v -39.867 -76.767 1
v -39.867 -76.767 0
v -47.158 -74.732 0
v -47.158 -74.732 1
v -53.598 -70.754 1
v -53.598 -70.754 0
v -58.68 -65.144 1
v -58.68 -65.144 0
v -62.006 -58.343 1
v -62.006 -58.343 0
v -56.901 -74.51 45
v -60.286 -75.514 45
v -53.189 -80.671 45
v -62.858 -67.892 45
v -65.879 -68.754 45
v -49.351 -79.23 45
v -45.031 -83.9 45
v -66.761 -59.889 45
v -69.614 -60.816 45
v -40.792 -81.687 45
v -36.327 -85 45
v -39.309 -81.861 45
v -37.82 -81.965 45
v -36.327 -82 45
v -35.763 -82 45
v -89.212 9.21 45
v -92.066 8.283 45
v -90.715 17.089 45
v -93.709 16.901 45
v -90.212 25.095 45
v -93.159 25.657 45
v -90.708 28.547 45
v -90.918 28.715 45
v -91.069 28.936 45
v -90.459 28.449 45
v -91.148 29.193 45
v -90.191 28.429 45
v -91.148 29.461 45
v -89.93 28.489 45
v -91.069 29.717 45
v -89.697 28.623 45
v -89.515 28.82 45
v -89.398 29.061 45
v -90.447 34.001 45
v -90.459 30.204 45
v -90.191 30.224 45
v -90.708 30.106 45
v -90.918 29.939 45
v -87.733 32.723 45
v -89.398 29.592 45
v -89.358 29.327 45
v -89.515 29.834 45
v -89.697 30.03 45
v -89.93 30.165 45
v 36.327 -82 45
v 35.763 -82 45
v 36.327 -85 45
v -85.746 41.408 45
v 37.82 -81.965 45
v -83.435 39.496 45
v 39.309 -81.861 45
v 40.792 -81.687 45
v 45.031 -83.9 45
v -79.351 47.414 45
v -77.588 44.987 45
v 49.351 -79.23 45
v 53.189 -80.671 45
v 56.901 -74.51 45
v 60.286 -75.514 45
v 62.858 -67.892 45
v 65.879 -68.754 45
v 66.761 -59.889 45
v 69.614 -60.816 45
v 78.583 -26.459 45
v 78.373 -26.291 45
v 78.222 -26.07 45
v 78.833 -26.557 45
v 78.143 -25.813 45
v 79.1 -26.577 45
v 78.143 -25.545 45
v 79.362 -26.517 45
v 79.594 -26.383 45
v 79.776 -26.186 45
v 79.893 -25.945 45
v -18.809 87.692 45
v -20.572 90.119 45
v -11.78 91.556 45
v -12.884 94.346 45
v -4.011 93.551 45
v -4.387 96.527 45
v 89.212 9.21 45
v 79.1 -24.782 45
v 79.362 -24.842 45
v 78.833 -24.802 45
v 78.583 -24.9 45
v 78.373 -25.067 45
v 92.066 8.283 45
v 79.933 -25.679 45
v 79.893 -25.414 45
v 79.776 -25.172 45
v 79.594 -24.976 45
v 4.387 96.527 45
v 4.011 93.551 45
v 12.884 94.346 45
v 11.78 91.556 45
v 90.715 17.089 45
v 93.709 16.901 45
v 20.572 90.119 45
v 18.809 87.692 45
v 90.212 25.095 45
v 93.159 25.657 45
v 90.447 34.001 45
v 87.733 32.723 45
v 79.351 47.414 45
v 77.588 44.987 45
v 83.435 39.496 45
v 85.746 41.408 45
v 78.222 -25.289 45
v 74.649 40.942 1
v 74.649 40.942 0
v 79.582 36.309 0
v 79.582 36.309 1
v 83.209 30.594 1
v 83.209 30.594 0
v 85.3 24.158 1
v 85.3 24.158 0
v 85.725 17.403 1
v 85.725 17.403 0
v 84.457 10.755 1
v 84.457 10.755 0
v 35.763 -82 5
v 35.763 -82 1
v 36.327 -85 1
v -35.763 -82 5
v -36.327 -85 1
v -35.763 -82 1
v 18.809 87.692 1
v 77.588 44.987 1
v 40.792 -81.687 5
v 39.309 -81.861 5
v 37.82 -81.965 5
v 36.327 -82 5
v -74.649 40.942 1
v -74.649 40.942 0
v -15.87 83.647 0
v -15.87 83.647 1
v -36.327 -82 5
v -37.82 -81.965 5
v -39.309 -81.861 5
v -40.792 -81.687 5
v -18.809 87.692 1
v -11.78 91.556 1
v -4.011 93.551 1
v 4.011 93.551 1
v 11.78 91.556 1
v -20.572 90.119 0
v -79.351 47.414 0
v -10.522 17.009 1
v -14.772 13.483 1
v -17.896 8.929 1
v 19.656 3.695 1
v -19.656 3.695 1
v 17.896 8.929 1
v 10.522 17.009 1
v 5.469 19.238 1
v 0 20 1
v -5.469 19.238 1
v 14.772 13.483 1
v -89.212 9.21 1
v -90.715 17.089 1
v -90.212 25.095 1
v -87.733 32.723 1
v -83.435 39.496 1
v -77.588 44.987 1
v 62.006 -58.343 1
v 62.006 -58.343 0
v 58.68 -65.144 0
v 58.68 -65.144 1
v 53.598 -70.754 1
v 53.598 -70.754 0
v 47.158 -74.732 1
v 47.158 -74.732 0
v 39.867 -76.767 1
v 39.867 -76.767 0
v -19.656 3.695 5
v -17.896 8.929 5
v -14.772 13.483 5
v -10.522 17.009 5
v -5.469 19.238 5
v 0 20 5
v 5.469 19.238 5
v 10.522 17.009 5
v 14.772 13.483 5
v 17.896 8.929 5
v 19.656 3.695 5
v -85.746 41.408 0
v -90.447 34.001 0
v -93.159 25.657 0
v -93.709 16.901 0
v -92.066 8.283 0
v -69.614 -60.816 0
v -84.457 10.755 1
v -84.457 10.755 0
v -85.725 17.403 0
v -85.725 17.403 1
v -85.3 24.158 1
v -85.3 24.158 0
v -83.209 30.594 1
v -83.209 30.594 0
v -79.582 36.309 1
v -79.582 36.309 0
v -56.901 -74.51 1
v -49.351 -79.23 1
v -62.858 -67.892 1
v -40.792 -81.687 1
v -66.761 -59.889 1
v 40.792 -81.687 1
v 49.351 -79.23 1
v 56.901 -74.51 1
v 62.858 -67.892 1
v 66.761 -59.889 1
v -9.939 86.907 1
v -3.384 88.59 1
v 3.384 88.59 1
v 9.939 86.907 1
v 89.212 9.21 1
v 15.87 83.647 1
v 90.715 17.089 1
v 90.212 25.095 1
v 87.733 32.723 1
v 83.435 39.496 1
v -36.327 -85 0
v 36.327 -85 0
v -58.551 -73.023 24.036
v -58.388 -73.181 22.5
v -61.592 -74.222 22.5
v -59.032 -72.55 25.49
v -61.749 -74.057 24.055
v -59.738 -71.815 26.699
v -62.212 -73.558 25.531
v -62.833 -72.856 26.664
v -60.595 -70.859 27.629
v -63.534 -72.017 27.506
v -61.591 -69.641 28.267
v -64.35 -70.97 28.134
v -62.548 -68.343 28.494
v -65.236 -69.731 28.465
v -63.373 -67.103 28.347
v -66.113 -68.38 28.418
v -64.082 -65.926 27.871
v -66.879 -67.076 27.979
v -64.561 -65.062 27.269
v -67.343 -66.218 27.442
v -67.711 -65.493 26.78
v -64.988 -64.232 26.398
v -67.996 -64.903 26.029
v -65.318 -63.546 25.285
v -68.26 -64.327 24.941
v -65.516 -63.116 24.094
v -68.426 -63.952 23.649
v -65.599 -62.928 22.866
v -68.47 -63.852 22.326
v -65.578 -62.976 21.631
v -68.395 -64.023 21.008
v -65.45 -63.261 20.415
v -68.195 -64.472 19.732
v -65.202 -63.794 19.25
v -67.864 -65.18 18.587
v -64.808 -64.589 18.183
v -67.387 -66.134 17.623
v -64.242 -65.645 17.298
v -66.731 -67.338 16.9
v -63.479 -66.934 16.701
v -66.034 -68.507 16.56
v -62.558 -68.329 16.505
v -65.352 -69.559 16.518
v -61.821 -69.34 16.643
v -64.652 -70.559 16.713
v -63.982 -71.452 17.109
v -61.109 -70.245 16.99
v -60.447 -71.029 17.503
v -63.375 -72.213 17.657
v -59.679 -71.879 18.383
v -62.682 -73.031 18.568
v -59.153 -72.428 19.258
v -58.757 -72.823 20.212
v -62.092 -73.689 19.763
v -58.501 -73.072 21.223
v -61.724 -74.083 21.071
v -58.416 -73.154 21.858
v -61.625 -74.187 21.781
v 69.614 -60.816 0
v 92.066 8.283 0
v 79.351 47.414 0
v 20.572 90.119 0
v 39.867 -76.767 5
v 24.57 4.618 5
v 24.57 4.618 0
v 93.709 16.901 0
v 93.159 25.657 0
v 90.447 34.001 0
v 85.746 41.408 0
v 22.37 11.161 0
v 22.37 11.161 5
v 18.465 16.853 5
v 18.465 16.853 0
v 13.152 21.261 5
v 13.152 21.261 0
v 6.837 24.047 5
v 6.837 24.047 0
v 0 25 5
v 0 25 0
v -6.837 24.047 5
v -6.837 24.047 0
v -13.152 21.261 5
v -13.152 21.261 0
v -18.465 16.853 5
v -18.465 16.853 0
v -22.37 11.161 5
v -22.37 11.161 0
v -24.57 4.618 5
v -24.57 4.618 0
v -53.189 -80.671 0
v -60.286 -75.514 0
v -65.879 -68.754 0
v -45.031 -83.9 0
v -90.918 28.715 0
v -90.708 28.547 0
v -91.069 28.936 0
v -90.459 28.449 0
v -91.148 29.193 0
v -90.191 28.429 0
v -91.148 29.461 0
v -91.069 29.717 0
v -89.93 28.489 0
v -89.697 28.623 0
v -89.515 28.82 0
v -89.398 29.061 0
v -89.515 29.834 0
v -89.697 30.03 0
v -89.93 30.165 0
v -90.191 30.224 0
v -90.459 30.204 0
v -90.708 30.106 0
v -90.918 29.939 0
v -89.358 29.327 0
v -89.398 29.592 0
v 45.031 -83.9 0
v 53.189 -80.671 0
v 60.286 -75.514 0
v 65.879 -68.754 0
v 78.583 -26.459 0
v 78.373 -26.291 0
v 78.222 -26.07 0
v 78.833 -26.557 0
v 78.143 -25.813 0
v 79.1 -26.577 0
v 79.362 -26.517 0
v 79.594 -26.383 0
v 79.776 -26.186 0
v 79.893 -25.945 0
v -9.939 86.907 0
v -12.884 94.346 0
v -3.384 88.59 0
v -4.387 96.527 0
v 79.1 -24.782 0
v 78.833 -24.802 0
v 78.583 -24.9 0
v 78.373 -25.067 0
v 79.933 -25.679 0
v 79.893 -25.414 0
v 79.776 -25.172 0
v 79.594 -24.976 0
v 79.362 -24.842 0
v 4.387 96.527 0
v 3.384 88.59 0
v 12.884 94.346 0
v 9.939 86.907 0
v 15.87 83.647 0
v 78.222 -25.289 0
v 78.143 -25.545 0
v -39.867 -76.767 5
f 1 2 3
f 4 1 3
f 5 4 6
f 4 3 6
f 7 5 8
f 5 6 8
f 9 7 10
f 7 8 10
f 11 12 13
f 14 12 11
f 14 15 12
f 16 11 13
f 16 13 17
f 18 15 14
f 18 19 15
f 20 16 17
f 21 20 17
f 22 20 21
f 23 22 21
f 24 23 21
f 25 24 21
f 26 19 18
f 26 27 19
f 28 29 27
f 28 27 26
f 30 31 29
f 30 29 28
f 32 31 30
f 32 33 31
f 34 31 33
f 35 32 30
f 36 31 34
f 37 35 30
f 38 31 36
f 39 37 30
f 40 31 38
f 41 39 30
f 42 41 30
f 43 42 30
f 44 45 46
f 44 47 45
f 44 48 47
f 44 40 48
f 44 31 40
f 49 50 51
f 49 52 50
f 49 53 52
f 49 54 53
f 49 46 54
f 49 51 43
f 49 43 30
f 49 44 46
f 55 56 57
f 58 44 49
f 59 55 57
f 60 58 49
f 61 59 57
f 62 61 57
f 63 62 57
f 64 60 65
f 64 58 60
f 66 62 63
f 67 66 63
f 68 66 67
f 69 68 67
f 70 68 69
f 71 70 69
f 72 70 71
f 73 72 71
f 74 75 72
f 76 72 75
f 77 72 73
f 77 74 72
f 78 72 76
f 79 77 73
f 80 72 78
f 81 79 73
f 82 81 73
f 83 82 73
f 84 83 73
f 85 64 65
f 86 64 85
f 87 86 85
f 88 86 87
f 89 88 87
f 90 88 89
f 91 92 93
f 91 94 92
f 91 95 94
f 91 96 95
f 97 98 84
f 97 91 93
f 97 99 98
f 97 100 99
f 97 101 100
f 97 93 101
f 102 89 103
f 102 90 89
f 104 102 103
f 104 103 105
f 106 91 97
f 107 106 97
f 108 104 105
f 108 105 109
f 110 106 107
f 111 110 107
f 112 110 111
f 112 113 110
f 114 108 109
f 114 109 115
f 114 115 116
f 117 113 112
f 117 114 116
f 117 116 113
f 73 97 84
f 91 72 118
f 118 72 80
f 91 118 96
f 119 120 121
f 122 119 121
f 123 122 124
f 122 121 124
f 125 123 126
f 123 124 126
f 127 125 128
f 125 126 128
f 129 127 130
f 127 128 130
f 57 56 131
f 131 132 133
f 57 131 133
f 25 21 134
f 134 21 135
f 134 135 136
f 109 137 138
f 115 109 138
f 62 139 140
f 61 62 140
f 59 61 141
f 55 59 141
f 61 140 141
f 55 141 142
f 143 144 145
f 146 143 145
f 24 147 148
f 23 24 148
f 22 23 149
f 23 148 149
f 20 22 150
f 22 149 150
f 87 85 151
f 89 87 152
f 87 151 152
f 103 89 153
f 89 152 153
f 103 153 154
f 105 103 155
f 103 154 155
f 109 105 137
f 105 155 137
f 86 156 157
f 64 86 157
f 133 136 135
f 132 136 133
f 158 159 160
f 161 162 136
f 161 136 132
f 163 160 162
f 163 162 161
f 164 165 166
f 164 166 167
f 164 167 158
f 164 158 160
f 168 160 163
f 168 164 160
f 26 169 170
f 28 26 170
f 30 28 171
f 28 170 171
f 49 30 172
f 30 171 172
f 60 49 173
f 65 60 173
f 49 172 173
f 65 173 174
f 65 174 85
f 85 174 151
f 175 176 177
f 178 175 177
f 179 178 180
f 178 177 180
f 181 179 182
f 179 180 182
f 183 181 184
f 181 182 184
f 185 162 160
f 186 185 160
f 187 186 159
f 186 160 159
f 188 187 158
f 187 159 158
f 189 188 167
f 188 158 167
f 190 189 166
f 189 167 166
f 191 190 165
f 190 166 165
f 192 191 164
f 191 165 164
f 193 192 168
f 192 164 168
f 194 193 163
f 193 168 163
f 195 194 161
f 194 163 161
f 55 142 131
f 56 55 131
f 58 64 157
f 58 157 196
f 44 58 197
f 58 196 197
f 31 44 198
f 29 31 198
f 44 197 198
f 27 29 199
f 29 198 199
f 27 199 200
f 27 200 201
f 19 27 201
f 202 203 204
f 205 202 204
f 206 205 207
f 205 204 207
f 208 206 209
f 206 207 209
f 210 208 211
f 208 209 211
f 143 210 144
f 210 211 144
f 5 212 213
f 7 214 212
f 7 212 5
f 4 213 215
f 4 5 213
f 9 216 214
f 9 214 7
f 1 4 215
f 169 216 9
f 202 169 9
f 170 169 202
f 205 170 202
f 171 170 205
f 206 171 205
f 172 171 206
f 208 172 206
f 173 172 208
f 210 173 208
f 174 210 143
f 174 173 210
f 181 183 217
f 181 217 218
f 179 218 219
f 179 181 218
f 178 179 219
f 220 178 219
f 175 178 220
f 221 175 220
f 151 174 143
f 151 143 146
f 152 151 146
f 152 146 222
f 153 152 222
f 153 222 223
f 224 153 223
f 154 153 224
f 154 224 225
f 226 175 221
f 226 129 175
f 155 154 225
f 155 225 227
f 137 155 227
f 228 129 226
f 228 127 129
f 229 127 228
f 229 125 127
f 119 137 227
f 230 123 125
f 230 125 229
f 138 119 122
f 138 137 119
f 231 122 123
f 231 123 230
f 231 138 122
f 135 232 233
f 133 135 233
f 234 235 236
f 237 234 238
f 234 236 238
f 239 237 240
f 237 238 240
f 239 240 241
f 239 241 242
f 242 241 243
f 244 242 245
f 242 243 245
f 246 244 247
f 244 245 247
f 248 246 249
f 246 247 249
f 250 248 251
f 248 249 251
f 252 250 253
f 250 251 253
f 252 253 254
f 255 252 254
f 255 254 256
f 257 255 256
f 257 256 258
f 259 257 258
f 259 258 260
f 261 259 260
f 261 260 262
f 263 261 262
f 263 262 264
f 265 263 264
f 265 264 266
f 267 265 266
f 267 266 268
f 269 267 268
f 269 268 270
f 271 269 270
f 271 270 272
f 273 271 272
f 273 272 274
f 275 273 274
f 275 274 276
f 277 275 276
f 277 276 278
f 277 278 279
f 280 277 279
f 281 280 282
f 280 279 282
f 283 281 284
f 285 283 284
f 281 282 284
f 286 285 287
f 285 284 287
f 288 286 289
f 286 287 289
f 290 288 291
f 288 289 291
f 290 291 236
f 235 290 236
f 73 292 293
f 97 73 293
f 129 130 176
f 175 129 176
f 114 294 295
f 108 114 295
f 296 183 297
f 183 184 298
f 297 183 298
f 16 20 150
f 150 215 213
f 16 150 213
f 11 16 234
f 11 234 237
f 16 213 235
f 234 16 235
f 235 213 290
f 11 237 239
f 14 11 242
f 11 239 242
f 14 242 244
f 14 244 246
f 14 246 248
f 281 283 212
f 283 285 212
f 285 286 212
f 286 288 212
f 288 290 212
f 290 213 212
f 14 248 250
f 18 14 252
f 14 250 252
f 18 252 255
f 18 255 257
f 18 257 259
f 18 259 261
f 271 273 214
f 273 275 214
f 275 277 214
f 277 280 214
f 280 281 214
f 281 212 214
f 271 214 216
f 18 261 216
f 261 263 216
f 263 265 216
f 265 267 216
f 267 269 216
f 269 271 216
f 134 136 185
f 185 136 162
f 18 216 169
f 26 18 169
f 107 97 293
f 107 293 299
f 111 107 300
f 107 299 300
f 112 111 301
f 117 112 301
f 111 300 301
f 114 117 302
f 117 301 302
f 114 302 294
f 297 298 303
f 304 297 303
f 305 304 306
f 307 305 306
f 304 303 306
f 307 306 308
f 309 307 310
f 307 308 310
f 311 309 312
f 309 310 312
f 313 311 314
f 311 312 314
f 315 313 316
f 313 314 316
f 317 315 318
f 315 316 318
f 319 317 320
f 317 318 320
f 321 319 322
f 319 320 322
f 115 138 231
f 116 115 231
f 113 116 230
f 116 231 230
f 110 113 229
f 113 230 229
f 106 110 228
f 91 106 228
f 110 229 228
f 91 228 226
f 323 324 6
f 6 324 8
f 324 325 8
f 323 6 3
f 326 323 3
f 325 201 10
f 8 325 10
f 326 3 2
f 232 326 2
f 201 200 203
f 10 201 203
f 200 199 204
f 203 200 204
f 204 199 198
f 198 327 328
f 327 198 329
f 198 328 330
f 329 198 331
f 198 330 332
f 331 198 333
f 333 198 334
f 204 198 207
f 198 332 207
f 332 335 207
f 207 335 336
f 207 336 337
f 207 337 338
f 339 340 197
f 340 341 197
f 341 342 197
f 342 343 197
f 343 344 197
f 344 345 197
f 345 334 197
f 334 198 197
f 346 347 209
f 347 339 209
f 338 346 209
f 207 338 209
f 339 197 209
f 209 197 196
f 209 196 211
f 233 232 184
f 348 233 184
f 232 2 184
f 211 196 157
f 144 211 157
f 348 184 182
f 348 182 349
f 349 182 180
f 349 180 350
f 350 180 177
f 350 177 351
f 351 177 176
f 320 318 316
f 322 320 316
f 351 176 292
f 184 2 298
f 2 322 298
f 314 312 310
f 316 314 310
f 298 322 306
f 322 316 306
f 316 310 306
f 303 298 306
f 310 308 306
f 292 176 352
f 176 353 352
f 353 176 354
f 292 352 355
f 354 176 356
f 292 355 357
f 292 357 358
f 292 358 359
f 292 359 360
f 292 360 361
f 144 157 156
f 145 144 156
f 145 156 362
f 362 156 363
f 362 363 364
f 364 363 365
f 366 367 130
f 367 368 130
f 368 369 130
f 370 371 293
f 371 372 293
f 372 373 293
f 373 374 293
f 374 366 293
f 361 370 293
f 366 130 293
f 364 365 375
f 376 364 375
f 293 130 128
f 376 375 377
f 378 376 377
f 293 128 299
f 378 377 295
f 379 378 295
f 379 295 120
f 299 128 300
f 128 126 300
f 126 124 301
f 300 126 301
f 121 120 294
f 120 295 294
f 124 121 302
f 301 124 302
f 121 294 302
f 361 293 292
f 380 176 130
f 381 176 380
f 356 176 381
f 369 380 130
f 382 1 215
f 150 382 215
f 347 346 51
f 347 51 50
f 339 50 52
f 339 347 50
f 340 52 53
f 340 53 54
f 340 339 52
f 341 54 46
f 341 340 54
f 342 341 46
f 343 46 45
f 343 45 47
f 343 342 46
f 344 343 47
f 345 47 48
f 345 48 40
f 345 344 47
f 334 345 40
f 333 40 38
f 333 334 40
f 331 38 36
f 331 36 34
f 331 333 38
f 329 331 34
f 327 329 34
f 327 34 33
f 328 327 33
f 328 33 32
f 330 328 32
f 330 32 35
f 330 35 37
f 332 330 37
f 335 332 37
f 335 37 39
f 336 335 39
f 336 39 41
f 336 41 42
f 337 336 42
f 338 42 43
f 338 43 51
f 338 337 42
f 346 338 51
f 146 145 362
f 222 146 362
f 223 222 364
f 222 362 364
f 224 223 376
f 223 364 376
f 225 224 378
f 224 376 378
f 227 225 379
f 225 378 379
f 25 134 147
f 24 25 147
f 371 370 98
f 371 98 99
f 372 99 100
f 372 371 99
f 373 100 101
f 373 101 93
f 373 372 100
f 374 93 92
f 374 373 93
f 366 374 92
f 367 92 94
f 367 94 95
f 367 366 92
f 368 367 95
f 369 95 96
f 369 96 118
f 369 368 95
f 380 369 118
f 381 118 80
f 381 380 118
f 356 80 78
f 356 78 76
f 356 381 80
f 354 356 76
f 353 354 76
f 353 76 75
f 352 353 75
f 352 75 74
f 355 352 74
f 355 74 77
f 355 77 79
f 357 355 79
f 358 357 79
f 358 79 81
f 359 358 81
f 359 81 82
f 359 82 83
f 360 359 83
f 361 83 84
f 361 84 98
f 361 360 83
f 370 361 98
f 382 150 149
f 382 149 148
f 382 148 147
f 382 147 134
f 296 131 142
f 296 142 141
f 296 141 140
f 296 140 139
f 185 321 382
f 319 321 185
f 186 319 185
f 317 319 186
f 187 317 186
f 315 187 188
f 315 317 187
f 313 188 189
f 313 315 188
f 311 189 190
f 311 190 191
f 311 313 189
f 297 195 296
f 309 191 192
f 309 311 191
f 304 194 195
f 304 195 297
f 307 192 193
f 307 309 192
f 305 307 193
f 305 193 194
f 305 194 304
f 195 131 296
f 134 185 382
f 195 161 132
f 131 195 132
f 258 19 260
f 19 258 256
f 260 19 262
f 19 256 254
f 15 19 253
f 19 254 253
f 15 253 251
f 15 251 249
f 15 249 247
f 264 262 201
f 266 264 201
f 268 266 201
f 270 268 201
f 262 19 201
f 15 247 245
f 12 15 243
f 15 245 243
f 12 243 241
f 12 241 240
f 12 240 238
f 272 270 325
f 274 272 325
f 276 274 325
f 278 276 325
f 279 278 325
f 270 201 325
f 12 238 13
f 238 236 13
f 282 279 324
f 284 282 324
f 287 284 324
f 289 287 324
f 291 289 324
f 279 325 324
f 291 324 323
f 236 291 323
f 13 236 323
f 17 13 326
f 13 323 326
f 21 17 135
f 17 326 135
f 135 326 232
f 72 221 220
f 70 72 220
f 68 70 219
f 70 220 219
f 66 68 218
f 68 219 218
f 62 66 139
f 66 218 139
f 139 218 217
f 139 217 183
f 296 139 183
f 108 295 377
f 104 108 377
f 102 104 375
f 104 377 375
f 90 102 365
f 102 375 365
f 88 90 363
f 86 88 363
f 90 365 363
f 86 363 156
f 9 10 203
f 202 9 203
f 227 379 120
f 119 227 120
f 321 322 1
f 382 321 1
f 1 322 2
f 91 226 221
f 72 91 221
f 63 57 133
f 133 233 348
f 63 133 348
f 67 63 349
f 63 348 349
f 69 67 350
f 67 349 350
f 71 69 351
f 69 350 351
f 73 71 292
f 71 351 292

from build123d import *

# Parameters (mm, degrees)
F0_R     = 0.9
F1_DEPTH = 45
F2_DEPTH = 5
F3_DEPTH = 1
F4_R     = 5.995213452
F5_DEPTH = 25


with BuildPart() as f1:
    # F0 (on Top) → F1 (new body)
    with BuildSketch(Plane.XY):
        with BuildLine():
            Line((69.6141044706, -60.8155948031), (92.0655032996, 8.2827057594))
            ThreePointArc((92.0655032996, 8.2827057594), (92.0655032996, 29.9138953656), (79.3510090595, 47.4138953656))
            Line((79.3510090595, 47.4138953656), (20.5724838302, 90.1189936781))
            ThreePointArc((20.5724838302, 90.1189936781), (0, 96.803398875), (-20.5724838302, 90.1189936781))
            Line((-20.5724838302, 90.1189936781), (-79.3510090595, 47.4138953656))
            ThreePointArc((-79.3510090595, 47.4138953656), (-92.0655032996, 29.9138953656), (-92.0655032996, 8.2827057594))
            Line((-92.0655032996, 8.2827057594), (-69.6141044706, -60.8155948031))
            ThreePointArc((-69.6141044706, -60.8155948031), (-56.8996102305, -78.3155948031), (-36.3271264003, -85))
            Line((-36.3271264003, -85), (-35.7632361451, -82))
            Line((-35.7632361451, -82), (-36.3271264003, -82))
            ThreePointArc((-36.3271264003, -82), (-38.5650226814, -81.9216512768), (-40.7919604428, -81.6869887647))
            ThreePointArc((-40.7919604428, -81.6869887647), (-56.9006983727, -74.5097559412), (-66.7609349217, -59.88854382))
            Line((-66.7609349217, -59.88854382), (-89.2123337507, 9.2097567425))
            ThreePointArc((-89.2123337507, 9.2097567425), (-89.2123337507, 28.9868443825), (-77.5876533026, 44.9868443825))
            Line((-77.5876533026, 44.9868443825), (-18.8091280734, 87.691942695))
            ThreePointArc((-18.8091280734, 87.691942695), (0, 93.803398875), (18.8091280734, 87.691942695))
            Line((18.8091280734, 87.691942695), (77.5876533026, 44.9868443825))
            ThreePointArc((77.5876533026, 44.9868443825), (89.2123337507, 28.9868443825), (89.2123337507, 9.2097567425))
            Line((89.2123337507, 9.2097567425), (66.7609349217, -59.88854382))
            ThreePointArc((66.7609349217, -59.88854382), (56.9006983727, -74.5097559412), (40.7919604428, -81.6869887647))
            ThreePointArc((40.7919604428, -81.6869887647), (38.5650226814, -81.9216512768), (36.3271264003, -82))
            Line((36.3271264003, -82), (35.7632361451, -82))
            Line((35.7632361451, -82), (36.3271264003, -85))
            ThreePointArc((36.3271264003, -85), (56.8996102305, -78.3155948031), (69.6141044706, -60.8155948031))
        make_face()
        with Locations((79.0327965041, -25.6793122326)):
            Circle(F0_R, mode=Mode.SUBTRACT)
        with Locations((-90.2584959186, 29.3267630763)):
            Circle(F0_R, mode=Mode.SUBTRACT)
    extrude(amount=F1_DEPTH)

    # F0 (on Top) → F2 (join)
    with BuildSketch(Plane.XY):
        with BuildLine():
            Line((19.6557918633, 3.6945698296), (34.8234190532, -77))
            Line((34.8234190532, -77), (36.3271264003, -77))
            ThreePointArc((36.3271264003, -77), (38.1009794725, -76.9416674554), (39.8671678511, -76.7669218725))
            Line((39.8671678511, -76.7669218725), (24.5697398292, 4.618212287))
            ThreePointArc((24.5697398292, 4.618212287), (0, 25), (-24.5697398292, 4.618212287))
            Line((-24.5697398292, 4.618212287), (-39.8671678511, -76.7669218725))
            ThreePointArc((-39.8671678511, -76.7669218725), (-38.1009794725, -76.9416674554), (-36.3271264003, -77))
            Line((-36.3271264003, -77), (-34.8234190532, -77))
            Line((-34.8234190532, -77), (-19.6557918633, 3.6945698296))
            ThreePointArc((-19.6557918633, 3.6945698296), (0, 20), (19.6557918633, 3.6945698296))
        make_face()
        with BuildLine():
            Line((-36.3271264003, -82), (-35.7632361451, -82))
            Line((-35.7632361451, -82), (-34.8234190532, -77))
            Line((-34.8234190532, -77), (-36.3271264003, -77))
            ThreePointArc((-36.3271264003, -77), (-38.1009794725, -76.9416674554), (-39.8671678511, -76.7669218725))
            Line((-39.8671678511, -76.7669218725), (-40.7919604428, -81.6869887647))
            ThreePointArc((-40.7919604428, -81.6869887647), (-38.5650226814, -81.9216512768), (-36.3271264003, -82))
        make_face()
        with BuildLine():
            Line((34.8234190532, -77), (35.7632361451, -82))
            Line((35.7632361451, -82), (36.3271264003, -82))
            ThreePointArc((36.3271264003, -82), (38.5650226814, -81.9216512768), (40.7919604428, -81.6869887647))
            Line((40.7919604428, -81.6869887647), (39.8671678511, -76.7669218725))
            ThreePointArc((39.8671678511, -76.7669218725), (38.1009794725, -76.9416674554), (36.3271264003, -77))
            Line((36.3271264003, -77), (34.8234190532, -77))
        make_face()
    extrude(amount=F2_DEPTH)

    # F0 (on Top) → F3 (join)
    with BuildSketch(Plane.XY):
        Polygon((-35.7632361451, -82), (35.7632361451, -82), (34.8234190532, -77), (-34.8234190532, -77), align=None)
        Polygon((-36.3271264003, -85), (36.3271264003, -85), (35.7632361451, -82), (-35.7632361451, -82), align=None)
        with BuildLine():
            Line((-34.8234190532, -77), (34.8234190532, -77))
            Line((34.8234190532, -77), (19.6557918633, 3.6945698296))
            ThreePointArc((19.6557918633, 3.6945698296), (0, 20), (-19.6557918633, 3.6945698296))
            Line((-19.6557918633, 3.6945698296), (-34.8234190532, -77))
        make_face()
        with BuildLine():
            Line((39.8671678511, -76.7669218725), (40.7919604428, -81.6869887647))
            ThreePointArc((40.7919604428, -81.6869887647), (56.9006983727, -74.5097559412), (66.7609349217, -59.88854382))
            Line((66.7609349217, -59.88854382), (89.2123337507, 9.2097567425))
            ThreePointArc((89.2123337507, 9.2097567425), (89.2123337507, 28.9868443825), (77.5876533026, 44.9868443825))
            Line((77.5876533026, 44.9868443825), (18.8091280734, 87.691942695))
            ThreePointArc((18.8091280734, 87.691942695), (0, 93.803398875), (-18.8091280734, 87.691942695))
            Line((-18.8091280734, 87.691942695), (-77.5876533026, 44.9868443825))
            ThreePointArc((-77.5876533026, 44.9868443825), (-89.2123337507, 28.9868443825), (-89.2123337507, 9.2097567425))
            Line((-89.2123337507, 9.2097567425), (-66.7609349217, -59.88854382))
            ThreePointArc((-66.7609349217, -59.88854382), (-56.9006983727, -74.5097559412), (-40.7919604428, -81.6869887647))
            Line((-40.7919604428, -81.6869887647), (-39.8671678511, -76.7669218725))
            ThreePointArc((-39.8671678511, -76.7669218725), (-53.5981184837, -70.7536221526), (-62.0056523402, -58.3434588481))
            Line((-62.0056523402, -58.3434588481), (-84.4570511692, 10.7548417144))
            ThreePointArc((-84.4570511692, 10.7548417144), (-84.4570511692, 27.4417594106), (-74.6487270411, 40.9417594106))
            Line((-74.6487270411, 40.9417594106), (-15.8702018119, 83.6468577231))
            ThreePointArc((-15.8702018119, 83.6468577231), (0, 88.803398875), (15.8702018119, 83.6468577231))
            Line((15.8702018119, 83.6468577231), (74.6487270411, 40.9417594106))
            ThreePointArc((74.6487270411, 40.9417594106), (84.4570511692, 27.4417594106), (84.4570511692, 10.7548417144))
            Line((84.4570511692, 10.7548417144), (62.0056523402, -58.3434588481))
            ThreePointArc((62.0056523402, -58.3434588481), (53.5981184837, -70.7536221526), (39.8671678511, -76.7669218725))
        make_face()
    extrude(amount=F3_DEPTH)

    # F4 (on face) → F5 (cut)
    with BuildSketch(Plane(origin=(-80.8398038851, -26.2664445219, 0), x_dir=(0.3090169944, -0.9510565163, 0), z_dir=(-0.9510565163, -0.3090169944, 0))):
        with Locations((45.5608554184, 22.5)):
            Circle(F4_R)
    extrude(amount=-F5_DEPTH, mode=Mode.SUBTRACT)


solid = f1.part
